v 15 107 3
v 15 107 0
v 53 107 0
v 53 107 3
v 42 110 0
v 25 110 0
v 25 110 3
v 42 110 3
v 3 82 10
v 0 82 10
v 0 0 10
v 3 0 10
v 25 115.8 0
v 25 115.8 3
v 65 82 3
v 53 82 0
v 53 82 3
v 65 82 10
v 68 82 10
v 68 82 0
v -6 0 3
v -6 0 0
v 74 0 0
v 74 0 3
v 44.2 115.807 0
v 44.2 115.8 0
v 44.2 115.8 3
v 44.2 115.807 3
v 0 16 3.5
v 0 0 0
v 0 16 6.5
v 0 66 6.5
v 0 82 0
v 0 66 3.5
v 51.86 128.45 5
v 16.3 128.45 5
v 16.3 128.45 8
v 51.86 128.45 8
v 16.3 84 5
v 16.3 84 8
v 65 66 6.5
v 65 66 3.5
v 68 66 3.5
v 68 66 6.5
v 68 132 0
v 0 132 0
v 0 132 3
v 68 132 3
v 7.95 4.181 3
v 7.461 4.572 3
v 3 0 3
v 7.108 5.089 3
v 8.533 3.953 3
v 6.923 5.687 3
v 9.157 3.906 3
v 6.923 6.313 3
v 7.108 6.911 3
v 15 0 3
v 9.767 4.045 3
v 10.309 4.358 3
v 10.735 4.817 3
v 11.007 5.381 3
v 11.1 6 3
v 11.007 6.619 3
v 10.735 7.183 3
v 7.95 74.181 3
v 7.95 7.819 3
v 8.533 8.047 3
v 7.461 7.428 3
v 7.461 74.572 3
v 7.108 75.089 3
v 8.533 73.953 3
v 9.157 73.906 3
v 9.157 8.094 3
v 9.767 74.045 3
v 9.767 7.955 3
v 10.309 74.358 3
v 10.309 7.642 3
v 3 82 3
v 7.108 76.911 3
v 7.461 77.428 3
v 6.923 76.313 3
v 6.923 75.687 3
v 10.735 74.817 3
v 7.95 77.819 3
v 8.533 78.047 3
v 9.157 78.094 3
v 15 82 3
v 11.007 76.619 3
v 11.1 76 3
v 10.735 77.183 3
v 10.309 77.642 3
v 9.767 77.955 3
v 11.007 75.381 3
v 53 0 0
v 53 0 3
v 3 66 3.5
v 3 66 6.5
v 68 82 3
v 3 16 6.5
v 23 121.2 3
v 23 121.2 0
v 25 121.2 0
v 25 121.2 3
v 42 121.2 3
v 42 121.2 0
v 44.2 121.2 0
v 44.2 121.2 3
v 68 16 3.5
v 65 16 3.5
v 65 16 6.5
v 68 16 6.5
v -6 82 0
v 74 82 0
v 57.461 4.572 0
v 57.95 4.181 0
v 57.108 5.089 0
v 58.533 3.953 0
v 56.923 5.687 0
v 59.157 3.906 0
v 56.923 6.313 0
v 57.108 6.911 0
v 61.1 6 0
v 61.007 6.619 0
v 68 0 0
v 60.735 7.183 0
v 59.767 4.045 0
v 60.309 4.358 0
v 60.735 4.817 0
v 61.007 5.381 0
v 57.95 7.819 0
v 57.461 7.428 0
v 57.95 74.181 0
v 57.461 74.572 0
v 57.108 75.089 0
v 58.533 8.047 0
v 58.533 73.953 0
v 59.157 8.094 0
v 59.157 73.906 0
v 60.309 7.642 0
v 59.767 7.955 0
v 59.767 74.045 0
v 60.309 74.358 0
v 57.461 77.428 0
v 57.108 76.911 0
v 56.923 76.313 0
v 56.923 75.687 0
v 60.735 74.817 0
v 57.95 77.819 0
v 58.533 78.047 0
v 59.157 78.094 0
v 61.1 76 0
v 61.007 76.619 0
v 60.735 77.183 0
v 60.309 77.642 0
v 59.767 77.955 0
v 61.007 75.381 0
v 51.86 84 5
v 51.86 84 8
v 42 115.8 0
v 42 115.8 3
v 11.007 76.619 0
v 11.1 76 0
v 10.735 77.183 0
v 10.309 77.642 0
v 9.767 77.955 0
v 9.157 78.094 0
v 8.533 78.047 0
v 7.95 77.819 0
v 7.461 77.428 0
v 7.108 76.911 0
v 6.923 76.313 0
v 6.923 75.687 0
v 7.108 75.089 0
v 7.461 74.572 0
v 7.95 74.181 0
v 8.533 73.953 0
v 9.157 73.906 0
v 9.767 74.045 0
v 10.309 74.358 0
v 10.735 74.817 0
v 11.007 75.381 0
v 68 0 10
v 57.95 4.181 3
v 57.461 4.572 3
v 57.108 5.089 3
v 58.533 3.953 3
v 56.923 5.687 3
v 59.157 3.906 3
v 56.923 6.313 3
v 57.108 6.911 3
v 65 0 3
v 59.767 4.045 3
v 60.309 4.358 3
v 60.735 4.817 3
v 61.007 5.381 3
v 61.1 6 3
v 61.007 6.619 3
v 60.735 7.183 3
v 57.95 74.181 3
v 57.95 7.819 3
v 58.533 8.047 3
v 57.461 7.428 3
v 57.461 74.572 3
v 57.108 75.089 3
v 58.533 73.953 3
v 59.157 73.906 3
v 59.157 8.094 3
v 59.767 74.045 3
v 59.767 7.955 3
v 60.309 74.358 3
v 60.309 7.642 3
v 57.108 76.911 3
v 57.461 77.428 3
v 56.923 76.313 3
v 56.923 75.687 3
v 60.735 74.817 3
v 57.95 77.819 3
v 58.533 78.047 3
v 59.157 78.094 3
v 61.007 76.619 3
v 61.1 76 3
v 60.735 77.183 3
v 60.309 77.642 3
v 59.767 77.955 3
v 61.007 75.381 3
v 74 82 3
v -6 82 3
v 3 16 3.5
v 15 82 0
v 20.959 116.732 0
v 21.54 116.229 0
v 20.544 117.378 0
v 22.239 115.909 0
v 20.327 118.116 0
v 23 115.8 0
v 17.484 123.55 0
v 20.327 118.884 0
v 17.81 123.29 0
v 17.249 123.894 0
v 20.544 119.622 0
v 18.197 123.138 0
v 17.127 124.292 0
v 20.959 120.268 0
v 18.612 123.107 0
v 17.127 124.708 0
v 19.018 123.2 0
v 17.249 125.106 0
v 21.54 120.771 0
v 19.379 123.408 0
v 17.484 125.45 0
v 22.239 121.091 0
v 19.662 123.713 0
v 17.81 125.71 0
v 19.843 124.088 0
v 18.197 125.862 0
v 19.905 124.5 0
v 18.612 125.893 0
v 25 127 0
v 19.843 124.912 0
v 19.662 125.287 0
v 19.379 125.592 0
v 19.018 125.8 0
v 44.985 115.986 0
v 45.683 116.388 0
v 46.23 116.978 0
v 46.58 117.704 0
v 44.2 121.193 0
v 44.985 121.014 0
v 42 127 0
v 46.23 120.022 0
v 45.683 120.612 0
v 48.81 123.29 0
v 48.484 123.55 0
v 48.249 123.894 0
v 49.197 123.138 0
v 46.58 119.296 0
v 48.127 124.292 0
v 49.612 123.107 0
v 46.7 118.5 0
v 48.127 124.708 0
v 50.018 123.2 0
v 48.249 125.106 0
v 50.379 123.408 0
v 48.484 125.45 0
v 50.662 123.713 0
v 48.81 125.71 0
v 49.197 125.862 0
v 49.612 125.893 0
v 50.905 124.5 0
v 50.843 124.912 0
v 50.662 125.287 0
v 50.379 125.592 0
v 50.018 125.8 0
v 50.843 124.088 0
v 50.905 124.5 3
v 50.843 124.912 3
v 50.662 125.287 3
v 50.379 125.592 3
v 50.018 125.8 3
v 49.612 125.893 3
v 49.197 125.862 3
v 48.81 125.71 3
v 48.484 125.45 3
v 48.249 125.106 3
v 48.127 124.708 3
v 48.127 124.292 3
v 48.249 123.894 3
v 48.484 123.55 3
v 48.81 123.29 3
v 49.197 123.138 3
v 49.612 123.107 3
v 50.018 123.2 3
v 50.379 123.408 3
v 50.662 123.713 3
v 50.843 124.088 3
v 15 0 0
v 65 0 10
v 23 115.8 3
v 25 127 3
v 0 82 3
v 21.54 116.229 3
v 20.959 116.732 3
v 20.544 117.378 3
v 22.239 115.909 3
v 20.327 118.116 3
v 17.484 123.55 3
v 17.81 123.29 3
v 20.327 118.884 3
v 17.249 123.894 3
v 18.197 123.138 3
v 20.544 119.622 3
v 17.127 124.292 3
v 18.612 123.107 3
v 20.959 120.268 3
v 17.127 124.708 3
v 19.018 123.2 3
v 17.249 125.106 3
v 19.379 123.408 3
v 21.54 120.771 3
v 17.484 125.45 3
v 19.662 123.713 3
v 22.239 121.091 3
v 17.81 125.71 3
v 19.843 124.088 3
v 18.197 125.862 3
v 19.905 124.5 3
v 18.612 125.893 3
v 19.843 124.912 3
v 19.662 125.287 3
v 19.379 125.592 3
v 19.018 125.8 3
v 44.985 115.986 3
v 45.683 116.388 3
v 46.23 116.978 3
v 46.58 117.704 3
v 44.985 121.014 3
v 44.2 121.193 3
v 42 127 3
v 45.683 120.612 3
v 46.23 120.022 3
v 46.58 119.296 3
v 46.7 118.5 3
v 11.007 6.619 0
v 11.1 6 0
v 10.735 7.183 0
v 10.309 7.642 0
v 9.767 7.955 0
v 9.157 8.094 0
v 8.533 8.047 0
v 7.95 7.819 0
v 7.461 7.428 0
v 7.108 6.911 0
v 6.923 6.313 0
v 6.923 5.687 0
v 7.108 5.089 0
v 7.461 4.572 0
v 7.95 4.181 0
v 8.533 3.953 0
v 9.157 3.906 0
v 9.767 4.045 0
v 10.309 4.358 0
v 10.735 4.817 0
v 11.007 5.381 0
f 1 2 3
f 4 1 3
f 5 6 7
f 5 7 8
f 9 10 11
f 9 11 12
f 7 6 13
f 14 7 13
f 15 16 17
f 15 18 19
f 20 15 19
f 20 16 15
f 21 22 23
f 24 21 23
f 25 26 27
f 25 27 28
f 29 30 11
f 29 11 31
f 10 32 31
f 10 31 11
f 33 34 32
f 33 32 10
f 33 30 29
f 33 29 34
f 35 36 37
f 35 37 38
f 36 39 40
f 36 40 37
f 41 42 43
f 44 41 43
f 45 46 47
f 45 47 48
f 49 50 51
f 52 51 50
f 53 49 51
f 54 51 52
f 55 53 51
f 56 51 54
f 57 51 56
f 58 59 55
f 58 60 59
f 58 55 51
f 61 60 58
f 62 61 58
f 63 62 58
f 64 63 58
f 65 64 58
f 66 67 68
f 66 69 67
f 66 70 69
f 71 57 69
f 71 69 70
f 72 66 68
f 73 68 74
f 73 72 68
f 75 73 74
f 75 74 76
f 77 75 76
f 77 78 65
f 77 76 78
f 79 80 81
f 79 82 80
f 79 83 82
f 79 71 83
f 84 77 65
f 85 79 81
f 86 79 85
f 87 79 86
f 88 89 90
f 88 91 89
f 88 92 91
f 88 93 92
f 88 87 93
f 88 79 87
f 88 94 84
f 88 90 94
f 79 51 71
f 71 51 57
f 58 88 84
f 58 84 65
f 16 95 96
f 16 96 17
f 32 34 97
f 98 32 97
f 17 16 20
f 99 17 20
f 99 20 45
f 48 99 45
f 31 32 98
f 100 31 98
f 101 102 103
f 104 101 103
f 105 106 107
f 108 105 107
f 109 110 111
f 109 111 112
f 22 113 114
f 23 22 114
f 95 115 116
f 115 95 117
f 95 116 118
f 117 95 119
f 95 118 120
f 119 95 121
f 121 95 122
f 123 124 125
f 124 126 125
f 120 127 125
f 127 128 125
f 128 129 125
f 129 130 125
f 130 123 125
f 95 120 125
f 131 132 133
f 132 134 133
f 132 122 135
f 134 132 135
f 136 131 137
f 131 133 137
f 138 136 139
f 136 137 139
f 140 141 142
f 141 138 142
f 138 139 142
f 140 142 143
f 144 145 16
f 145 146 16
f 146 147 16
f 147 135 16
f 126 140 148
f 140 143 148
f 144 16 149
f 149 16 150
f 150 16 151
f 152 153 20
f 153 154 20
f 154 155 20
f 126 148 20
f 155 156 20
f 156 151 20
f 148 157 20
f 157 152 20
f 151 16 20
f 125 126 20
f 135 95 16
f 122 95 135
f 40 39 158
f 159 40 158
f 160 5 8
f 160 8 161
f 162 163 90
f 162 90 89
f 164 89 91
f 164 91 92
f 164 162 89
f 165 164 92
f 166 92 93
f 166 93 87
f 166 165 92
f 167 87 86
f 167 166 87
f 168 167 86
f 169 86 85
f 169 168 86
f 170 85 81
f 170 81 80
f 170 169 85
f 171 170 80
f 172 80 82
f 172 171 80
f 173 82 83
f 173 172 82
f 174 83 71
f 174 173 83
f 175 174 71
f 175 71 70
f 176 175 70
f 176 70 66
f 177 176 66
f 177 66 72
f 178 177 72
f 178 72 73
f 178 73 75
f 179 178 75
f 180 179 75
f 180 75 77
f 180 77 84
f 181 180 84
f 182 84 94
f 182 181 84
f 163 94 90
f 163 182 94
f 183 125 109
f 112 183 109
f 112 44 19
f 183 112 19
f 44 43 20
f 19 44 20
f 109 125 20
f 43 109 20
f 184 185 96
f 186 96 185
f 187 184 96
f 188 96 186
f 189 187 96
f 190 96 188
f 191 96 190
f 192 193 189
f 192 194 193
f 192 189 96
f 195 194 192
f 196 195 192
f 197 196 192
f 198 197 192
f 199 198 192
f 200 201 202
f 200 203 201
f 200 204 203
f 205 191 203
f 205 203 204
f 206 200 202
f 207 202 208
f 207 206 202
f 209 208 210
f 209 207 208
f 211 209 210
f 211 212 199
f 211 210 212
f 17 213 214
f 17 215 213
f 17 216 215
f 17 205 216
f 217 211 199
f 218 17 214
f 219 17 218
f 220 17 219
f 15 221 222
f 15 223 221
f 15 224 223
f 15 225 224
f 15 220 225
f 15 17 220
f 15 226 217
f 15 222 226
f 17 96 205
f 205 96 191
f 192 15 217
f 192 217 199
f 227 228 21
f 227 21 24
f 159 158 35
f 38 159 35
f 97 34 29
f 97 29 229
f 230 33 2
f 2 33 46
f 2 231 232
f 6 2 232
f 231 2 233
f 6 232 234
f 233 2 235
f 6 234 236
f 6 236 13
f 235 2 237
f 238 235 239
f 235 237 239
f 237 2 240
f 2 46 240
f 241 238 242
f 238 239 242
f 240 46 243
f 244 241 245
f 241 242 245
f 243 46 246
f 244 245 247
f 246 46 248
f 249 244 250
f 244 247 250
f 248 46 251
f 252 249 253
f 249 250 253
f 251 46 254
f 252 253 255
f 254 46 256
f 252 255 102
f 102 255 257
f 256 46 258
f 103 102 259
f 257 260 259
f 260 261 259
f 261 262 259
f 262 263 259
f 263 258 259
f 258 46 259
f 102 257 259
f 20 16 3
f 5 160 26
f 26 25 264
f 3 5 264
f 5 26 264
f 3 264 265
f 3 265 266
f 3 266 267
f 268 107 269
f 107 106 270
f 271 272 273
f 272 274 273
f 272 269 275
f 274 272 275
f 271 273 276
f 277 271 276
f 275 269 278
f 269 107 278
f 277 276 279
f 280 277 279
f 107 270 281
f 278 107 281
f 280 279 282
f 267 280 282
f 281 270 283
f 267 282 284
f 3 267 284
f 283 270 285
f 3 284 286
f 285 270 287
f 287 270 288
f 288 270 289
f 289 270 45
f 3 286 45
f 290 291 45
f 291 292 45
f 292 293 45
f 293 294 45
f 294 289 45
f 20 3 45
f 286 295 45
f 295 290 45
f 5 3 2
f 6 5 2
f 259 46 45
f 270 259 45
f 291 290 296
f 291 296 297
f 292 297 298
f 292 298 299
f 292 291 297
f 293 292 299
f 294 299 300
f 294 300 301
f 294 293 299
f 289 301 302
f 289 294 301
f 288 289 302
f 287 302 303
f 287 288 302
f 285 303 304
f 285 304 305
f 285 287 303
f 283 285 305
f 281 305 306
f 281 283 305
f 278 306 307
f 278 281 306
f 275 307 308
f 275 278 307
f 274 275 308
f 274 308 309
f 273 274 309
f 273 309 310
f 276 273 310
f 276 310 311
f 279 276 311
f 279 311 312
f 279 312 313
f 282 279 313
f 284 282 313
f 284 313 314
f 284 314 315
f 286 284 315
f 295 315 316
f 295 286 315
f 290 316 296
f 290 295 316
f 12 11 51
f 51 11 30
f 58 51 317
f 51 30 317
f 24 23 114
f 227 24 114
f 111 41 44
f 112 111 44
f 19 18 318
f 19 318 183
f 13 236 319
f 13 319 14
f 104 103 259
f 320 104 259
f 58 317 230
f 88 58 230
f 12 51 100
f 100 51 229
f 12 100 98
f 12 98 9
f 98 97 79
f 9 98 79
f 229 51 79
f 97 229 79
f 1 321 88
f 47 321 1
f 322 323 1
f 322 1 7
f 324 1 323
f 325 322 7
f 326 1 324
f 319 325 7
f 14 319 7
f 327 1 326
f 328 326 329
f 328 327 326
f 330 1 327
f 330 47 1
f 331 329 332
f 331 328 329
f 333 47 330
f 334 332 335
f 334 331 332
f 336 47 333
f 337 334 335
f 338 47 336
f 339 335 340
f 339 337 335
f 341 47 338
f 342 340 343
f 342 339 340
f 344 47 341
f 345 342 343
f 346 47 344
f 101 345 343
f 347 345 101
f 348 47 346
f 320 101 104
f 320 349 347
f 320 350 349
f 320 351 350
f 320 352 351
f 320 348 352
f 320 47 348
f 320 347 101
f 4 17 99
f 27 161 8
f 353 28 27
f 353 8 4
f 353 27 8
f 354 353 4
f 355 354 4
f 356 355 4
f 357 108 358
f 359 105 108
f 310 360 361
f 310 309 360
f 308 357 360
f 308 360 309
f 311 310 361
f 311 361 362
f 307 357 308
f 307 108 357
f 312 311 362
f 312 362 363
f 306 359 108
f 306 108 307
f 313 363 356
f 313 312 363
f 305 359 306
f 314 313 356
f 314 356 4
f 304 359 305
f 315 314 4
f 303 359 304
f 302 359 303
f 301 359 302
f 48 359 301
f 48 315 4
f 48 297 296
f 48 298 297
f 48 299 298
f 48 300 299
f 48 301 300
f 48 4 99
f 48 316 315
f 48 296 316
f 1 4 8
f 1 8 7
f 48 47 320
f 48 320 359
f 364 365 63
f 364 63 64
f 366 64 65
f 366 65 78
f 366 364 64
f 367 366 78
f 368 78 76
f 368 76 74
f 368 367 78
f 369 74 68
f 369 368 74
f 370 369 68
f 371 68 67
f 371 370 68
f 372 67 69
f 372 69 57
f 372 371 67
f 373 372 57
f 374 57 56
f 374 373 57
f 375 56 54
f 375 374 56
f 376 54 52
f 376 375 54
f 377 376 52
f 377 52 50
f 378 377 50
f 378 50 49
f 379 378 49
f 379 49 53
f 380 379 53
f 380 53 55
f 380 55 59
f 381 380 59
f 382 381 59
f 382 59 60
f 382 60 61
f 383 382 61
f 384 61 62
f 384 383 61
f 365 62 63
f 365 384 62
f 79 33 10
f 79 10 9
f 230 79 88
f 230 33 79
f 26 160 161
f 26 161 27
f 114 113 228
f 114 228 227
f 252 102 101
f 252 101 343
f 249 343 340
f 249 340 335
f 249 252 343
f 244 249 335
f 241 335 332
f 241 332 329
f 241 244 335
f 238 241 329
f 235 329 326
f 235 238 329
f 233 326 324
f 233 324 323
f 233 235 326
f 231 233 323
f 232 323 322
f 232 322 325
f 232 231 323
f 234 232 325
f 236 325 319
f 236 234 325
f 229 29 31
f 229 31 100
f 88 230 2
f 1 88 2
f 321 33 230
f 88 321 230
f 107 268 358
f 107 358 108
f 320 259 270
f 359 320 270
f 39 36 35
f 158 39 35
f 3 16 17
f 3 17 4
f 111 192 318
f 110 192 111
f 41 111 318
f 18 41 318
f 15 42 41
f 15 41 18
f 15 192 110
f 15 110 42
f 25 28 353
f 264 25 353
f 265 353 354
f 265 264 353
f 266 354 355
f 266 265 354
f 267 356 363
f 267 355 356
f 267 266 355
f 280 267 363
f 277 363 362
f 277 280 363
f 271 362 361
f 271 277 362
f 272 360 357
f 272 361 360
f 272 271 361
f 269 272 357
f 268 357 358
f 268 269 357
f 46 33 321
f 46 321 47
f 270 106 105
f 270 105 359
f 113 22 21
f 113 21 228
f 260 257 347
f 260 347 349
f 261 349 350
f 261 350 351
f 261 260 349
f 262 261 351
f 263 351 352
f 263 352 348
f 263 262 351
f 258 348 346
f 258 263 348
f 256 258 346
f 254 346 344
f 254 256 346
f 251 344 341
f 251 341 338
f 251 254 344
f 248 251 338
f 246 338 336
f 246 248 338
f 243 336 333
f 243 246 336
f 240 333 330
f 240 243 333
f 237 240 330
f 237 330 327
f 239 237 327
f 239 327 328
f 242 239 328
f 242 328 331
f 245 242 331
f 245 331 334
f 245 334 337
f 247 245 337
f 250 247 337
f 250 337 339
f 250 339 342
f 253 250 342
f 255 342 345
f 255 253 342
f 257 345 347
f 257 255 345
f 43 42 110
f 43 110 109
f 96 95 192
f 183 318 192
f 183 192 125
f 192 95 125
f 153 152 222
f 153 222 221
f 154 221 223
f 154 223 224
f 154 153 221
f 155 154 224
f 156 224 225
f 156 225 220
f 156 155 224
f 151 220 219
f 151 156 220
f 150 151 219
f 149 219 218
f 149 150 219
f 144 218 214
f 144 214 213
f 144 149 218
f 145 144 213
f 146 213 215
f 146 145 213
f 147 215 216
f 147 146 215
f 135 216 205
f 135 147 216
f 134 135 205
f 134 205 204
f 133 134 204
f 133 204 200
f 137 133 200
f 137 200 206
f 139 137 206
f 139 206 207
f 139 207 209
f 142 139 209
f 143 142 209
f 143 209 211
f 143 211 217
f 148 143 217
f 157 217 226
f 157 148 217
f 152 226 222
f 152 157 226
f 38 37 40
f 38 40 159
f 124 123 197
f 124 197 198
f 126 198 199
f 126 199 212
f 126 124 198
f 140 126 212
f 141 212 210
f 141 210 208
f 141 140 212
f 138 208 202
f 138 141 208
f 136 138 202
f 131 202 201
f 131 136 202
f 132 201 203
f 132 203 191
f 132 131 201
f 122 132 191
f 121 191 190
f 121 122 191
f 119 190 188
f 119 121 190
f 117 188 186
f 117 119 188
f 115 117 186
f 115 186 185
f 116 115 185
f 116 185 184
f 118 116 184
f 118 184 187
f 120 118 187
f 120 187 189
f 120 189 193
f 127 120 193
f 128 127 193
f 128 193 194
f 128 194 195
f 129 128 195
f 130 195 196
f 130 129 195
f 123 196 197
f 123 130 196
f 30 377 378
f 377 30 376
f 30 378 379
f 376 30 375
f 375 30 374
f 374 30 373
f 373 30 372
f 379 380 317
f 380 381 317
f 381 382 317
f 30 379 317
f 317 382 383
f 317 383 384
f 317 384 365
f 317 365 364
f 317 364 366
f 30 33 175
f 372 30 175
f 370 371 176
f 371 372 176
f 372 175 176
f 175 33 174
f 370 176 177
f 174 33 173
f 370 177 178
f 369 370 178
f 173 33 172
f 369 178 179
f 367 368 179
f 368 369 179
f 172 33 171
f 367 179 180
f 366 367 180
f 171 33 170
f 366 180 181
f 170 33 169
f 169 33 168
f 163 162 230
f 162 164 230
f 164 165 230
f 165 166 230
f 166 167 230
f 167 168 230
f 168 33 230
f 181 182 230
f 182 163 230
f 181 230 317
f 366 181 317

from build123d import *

# Parameters (mm, degrees)
BOX006_W          = 80
BOX006_H          = 82
BOX006_DEPTH      = 3
BOX008_W          = 35.56
BOX008_H          = 44.45
BOX008_DEPTH      = 3
BOX005_W          = 3
BOX005_H          = 50
BOX005_DEPTH      = 3
BOX003_W          = 3
BOX003_H          = 82
BOX003_DEPTH      = 10
CYLINDER001_R     = 2.1
CYLINDER001_DEPTH = 3
CYLINDER003_R     = 2.1
CYLINDER003_DEPTH = 3
BOX002_W          = 15
BOX002_H          = 82
BOX002_DEPTH      = 3
CYLINDER002_R     = 2.1
CYLINDER002_DEPTH = 3
CYLINDER_R        = 2.1
CYLINDER_DEPTH    = 3
BOX_W             = 15
BOX_H             = 82
BOX_DEPTH         = 3
BOX004_W          = 3
BOX004_H          = 50
BOX004_DEPTH      = 3
BOX001_W          = 3
BOX001_H          = 82
BOX001_DEPTH      = 10
CYLINDER007_R     = 1.397
CYLINDER007_DEPTH = 3
CYLINDER006_R     = 1.397
CYLINDER006_DEPTH = 3
BOX011_W          = 17
BOX011_H          = 17
BOX011_DEPTH      = 3
CYLINDER004_R     = 2.7
CYLINDER004_DEPTH = 3
CYLINDER005_R     = 2.7
CYLINDER005_DEPTH = 3
BOX012_W          = 5.2
BOX012_H          = 5.4
BOX012_DEPTH      = 3
BOX013_W          = 5.2
BOX013_H          = 5.4
BOX013_DEPTH      = 3
BOX007_W          = 15
BOX007_H          = 50
BOX007_DEPTH      = 3
BOX009_W          = 38
BOX009_H          = 25
BOX009_DEPTH      = 3
BOX010_W          = 15
BOX010_H          = 50
BOX010_DEPTH      = 3


with BuildPart() as g366:
    # Box006 → Box006 (new body)
    with BuildSketch(Plane(origin=(-6, 0, 0), x_dir=(1, 0, 0), z_dir=(0, 0, 1))):
        with Locations((40, 41)):
            Rectangle(BOX006_W, BOX006_H)
    extrude(amount=BOX006_DEPTH)


with BuildPart() as cam:
    # Box008 → Box008 (new body)
    with BuildSketch(Plane(origin=(16.3, 84, 5), x_dir=(1, 0, 0), z_dir=(0, 0, 1))):
        with Locations((17.78, 22.225)):
            Rectangle(BOX008_W, BOX008_H)
    extrude(amount=BOX008_DEPTH)


with BuildPart() as side2_cut:
    # Box005 → Box005 (new body)
    with BuildSketch(Plane(origin=(65, 16, 3.5), x_dir=(1, 0, 0), z_dir=(0, 0, 1))):
        with Locations((1.5, 25)):
            Rectangle(BOX005_W, BOX005_H)
    extrude(amount=BOX005_DEPTH)


with BuildPart() as cut003:
    # Box003 → Box003 (new body)
    with BuildSketch(Plane(origin=(65, 0, 0), x_dir=(1, 0, 0), z_dir=(0, 0, 1))):
        with Locations((1.5, 41)):
            Rectangle(BOX003_W, BOX003_H)
    extrude(amount=BOX003_DEPTH)

    # Cut003: cut side2_cut
    add(side2_cut.part, mode=Mode.SUBTRACT)


with BuildPart() as hole2:
    # Cylinder001 → Cylinder001 (new body)
    with BuildSketch(Plane(origin=(59, 76, 0), x_dir=(1, 0, 0), z_dir=(0, 0, 1))):
        Circle(CYLINDER001_R)
    extrude(amount=CYLINDER001_DEPTH)


with BuildPart() as fusion001:
    # Cylinder003 → Cylinder003 (new body)
    with BuildSketch(Plane(origin=(59, 6, 0), x_dir=(1, 0, 0), z_dir=(0, 0, 1))):
        Circle(CYLINDER003_R)
    extrude(amount=CYLINDER003_DEPTH)

    # Fusion001: union hole2
    add(hole2.part)


with BuildPart() as fusion005:
    # Box002 → Box002 (new body)
    with BuildSketch(Plane(origin=(53, 0, 0), x_dir=(1, 0, 0), z_dir=(0, 0, 1))):
        with Locations((7.5, 41)):
            Rectangle(BOX002_W, BOX002_H)
    extrude(amount=BOX002_DEPTH)

    # Cut001: cut Fusion001
    add(fusion001.part, mode=Mode.SUBTRACT)

    # Fusion005: union Cut003
    add(cut003.part)


with BuildPart() as hole3:
    # Cylinder002 → Cylinder002 (new body)
    with BuildSketch(Plane(origin=(9, 6, 0), x_dir=(1, 0, 0), z_dir=(0, 0, 1))):
        Circle(CYLINDER002_R)
    extrude(amount=CYLINDER002_DEPTH)


with BuildPart() as fusion:
    # Cylinder → Cylinder (new body)
    with BuildSketch(Plane(origin=(9, 76, 0), x_dir=(1, 0, 0), z_dir=(0, 0, 1))):
        Circle(CYLINDER_R)
    extrude(amount=CYLINDER_DEPTH)

    # Fusion: union hole3
    add(hole3.part)


with BuildPart() as cut:
    # Box → Box (new body)
    with BuildSketch(Plane.XY):
        with Locations((7.5, 41)):
            Rectangle(BOX_W, BOX_H)
    extrude(amount=BOX_DEPTH)

    # Cut: cut Fusion
    add(fusion.part, mode=Mode.SUBTRACT)


with BuildPart() as side1_cut:
    # Box004 → Box004 (new body)
    with BuildSketch(Plane(origin=(0, 16, 3.5), x_dir=(1, 0, 0), z_dir=(0, 0, 1))):
        with Locations((1.5, 25)):
            Rectangle(BOX004_W, BOX004_H)
    extrude(amount=BOX004_DEPTH)


with BuildPart() as fusion006:
    # Box001 → Box001 (new body)
    with BuildSketch(Plane.XY):
        with Locations((1.5, 41)):
            Rectangle(BOX001_W, BOX001_H)
    extrude(amount=BOX001_DEPTH)

    # Cut002: cut side1_cut
    add(side1_cut.part, mode=Mode.SUBTRACT)

    # Fusion006: union Cut
    add(cut.part)


with BuildPart() as cylinder007:
    # Cylinder007 → Cylinder007 (new body)
    with BuildSketch(Plane(origin=(49.508, 124.5, 0), x_dir=(1, 0, 0), z_dir=(0, 0, 1))):
        Circle(CYLINDER007_R)
    extrude(amount=CYLINDER007_DEPTH)


with BuildPart() as hole1:
    # Cylinder006 → Cylinder006 (new body)
    with BuildSketch(Plane(origin=(18.508, 124.5, 0), x_dir=(1, 0, 0), z_dir=(0, 0, 1))):
        Circle(CYLINDER006_R)
    extrude(amount=CYLINDER006_DEPTH)


with BuildPart() as openmv_2_cut001:
    # Box011 → Box011 (new body)
    with BuildSketch(Plane(origin=(25, 110, 0), x_dir=(1, 0, 0), z_dir=(0, 0, 1))):
        with Locations((8.5, 8.5)):
            Rectangle(BOX011_W, BOX011_H)
    extrude(amount=BOX011_DEPTH)


with BuildPart() as openmv_2_cut:
    # Cylinder004 → Cylinder004 (new body)
    with BuildSketch(Plane(origin=(23, 118.5, 0), x_dir=(1, 0, 0), z_dir=(0, 0, 1))):
        Circle(CYLINDER004_R)
    extrude(amount=CYLINDER004_DEPTH)


with BuildPart() as openmv_2_cut002:
    # Cylinder005 → Cylinder005 (new body)
    with BuildSketch(Plane(origin=(44, 118.5, 0), x_dir=(1, 0, 0), z_dir=(0, 0, 1))):
        Circle(CYLINDER005_R)
    extrude(amount=CYLINDER005_DEPTH)


with BuildPart() as openmv_2_cut003:
    # Box012 → Box012 (new body)
    with BuildSketch(Plane(origin=(23, 115.8, 0), x_dir=(1, 0, 0), z_dir=(0, 0, 1))):
        with Locations((2.6, 2.7)):
            Rectangle(BOX012_W, BOX012_H)
    extrude(amount=BOX012_DEPTH)


with BuildPart() as fusion007:
    # Box013 → Box013 (new body)
    with BuildSketch(Plane(origin=(39, 115.8, 0), x_dir=(1, 0, 0), z_dir=(0, 0, 1))):
        with Locations((2.6, 2.7)):
            Rectangle(BOX013_W, BOX013_H)
    extrude(amount=BOX013_DEPTH)

    # Fusion007: union Cylinder007, Hole1, OpenMV_2_cut001, OpenMV_2_cut, OpenMV_2_cut002, OpenMV_2_cut003
    add(cylinder007.part)
    add(hole1.part)
    add(openmv_2_cut001.part)
    add(openmv_2_cut.part)
    add(openmv_2_cut002.part)
    add(openmv_2_cut003.part)


with BuildPart() as openmv1:
    # Box007 → Box007 (new body)
    with BuildSketch(Plane(origin=(0, 82, 0), x_dir=(1, 0, 0), z_dir=(0, 0, 1))):
        with Locations((7.5, 25)):
            Rectangle(BOX007_W, BOX007_H)
    extrude(amount=BOX007_DEPTH)


with BuildPart() as box009:
    # Box009 → Box009 (new body)
    with BuildSketch(Plane(origin=(15, 107, 0), x_dir=(1, 0, 0), z_dir=(0, 0, 1))):
        with Locations((19, 12.5)):
            Rectangle(BOX009_W, BOX009_H)
    extrude(amount=BOX009_DEPTH)


with BuildPart() as cut004:
    # Box010 → Box010 (new body)
    with BuildSketch(Plane(origin=(53, 82, 0), x_dir=(1, 0, 0), z_dir=(0, 0, 1))):
        with Locations((7.5, 25)):
            Rectangle(BOX010_W, BOX010_H)
    extrude(amount=BOX010_DEPTH)

    # Fusion003: union OpenMV1, Box009
    add(openmv1.part)
    add(box009.part)

    # Cut004: cut Fusion007
    add(fusion007.part, mode=Mode.SUBTRACT)


solid = Compound([g366.part, cam.part, fusion005.part, fusion006.part, cut004.part])
